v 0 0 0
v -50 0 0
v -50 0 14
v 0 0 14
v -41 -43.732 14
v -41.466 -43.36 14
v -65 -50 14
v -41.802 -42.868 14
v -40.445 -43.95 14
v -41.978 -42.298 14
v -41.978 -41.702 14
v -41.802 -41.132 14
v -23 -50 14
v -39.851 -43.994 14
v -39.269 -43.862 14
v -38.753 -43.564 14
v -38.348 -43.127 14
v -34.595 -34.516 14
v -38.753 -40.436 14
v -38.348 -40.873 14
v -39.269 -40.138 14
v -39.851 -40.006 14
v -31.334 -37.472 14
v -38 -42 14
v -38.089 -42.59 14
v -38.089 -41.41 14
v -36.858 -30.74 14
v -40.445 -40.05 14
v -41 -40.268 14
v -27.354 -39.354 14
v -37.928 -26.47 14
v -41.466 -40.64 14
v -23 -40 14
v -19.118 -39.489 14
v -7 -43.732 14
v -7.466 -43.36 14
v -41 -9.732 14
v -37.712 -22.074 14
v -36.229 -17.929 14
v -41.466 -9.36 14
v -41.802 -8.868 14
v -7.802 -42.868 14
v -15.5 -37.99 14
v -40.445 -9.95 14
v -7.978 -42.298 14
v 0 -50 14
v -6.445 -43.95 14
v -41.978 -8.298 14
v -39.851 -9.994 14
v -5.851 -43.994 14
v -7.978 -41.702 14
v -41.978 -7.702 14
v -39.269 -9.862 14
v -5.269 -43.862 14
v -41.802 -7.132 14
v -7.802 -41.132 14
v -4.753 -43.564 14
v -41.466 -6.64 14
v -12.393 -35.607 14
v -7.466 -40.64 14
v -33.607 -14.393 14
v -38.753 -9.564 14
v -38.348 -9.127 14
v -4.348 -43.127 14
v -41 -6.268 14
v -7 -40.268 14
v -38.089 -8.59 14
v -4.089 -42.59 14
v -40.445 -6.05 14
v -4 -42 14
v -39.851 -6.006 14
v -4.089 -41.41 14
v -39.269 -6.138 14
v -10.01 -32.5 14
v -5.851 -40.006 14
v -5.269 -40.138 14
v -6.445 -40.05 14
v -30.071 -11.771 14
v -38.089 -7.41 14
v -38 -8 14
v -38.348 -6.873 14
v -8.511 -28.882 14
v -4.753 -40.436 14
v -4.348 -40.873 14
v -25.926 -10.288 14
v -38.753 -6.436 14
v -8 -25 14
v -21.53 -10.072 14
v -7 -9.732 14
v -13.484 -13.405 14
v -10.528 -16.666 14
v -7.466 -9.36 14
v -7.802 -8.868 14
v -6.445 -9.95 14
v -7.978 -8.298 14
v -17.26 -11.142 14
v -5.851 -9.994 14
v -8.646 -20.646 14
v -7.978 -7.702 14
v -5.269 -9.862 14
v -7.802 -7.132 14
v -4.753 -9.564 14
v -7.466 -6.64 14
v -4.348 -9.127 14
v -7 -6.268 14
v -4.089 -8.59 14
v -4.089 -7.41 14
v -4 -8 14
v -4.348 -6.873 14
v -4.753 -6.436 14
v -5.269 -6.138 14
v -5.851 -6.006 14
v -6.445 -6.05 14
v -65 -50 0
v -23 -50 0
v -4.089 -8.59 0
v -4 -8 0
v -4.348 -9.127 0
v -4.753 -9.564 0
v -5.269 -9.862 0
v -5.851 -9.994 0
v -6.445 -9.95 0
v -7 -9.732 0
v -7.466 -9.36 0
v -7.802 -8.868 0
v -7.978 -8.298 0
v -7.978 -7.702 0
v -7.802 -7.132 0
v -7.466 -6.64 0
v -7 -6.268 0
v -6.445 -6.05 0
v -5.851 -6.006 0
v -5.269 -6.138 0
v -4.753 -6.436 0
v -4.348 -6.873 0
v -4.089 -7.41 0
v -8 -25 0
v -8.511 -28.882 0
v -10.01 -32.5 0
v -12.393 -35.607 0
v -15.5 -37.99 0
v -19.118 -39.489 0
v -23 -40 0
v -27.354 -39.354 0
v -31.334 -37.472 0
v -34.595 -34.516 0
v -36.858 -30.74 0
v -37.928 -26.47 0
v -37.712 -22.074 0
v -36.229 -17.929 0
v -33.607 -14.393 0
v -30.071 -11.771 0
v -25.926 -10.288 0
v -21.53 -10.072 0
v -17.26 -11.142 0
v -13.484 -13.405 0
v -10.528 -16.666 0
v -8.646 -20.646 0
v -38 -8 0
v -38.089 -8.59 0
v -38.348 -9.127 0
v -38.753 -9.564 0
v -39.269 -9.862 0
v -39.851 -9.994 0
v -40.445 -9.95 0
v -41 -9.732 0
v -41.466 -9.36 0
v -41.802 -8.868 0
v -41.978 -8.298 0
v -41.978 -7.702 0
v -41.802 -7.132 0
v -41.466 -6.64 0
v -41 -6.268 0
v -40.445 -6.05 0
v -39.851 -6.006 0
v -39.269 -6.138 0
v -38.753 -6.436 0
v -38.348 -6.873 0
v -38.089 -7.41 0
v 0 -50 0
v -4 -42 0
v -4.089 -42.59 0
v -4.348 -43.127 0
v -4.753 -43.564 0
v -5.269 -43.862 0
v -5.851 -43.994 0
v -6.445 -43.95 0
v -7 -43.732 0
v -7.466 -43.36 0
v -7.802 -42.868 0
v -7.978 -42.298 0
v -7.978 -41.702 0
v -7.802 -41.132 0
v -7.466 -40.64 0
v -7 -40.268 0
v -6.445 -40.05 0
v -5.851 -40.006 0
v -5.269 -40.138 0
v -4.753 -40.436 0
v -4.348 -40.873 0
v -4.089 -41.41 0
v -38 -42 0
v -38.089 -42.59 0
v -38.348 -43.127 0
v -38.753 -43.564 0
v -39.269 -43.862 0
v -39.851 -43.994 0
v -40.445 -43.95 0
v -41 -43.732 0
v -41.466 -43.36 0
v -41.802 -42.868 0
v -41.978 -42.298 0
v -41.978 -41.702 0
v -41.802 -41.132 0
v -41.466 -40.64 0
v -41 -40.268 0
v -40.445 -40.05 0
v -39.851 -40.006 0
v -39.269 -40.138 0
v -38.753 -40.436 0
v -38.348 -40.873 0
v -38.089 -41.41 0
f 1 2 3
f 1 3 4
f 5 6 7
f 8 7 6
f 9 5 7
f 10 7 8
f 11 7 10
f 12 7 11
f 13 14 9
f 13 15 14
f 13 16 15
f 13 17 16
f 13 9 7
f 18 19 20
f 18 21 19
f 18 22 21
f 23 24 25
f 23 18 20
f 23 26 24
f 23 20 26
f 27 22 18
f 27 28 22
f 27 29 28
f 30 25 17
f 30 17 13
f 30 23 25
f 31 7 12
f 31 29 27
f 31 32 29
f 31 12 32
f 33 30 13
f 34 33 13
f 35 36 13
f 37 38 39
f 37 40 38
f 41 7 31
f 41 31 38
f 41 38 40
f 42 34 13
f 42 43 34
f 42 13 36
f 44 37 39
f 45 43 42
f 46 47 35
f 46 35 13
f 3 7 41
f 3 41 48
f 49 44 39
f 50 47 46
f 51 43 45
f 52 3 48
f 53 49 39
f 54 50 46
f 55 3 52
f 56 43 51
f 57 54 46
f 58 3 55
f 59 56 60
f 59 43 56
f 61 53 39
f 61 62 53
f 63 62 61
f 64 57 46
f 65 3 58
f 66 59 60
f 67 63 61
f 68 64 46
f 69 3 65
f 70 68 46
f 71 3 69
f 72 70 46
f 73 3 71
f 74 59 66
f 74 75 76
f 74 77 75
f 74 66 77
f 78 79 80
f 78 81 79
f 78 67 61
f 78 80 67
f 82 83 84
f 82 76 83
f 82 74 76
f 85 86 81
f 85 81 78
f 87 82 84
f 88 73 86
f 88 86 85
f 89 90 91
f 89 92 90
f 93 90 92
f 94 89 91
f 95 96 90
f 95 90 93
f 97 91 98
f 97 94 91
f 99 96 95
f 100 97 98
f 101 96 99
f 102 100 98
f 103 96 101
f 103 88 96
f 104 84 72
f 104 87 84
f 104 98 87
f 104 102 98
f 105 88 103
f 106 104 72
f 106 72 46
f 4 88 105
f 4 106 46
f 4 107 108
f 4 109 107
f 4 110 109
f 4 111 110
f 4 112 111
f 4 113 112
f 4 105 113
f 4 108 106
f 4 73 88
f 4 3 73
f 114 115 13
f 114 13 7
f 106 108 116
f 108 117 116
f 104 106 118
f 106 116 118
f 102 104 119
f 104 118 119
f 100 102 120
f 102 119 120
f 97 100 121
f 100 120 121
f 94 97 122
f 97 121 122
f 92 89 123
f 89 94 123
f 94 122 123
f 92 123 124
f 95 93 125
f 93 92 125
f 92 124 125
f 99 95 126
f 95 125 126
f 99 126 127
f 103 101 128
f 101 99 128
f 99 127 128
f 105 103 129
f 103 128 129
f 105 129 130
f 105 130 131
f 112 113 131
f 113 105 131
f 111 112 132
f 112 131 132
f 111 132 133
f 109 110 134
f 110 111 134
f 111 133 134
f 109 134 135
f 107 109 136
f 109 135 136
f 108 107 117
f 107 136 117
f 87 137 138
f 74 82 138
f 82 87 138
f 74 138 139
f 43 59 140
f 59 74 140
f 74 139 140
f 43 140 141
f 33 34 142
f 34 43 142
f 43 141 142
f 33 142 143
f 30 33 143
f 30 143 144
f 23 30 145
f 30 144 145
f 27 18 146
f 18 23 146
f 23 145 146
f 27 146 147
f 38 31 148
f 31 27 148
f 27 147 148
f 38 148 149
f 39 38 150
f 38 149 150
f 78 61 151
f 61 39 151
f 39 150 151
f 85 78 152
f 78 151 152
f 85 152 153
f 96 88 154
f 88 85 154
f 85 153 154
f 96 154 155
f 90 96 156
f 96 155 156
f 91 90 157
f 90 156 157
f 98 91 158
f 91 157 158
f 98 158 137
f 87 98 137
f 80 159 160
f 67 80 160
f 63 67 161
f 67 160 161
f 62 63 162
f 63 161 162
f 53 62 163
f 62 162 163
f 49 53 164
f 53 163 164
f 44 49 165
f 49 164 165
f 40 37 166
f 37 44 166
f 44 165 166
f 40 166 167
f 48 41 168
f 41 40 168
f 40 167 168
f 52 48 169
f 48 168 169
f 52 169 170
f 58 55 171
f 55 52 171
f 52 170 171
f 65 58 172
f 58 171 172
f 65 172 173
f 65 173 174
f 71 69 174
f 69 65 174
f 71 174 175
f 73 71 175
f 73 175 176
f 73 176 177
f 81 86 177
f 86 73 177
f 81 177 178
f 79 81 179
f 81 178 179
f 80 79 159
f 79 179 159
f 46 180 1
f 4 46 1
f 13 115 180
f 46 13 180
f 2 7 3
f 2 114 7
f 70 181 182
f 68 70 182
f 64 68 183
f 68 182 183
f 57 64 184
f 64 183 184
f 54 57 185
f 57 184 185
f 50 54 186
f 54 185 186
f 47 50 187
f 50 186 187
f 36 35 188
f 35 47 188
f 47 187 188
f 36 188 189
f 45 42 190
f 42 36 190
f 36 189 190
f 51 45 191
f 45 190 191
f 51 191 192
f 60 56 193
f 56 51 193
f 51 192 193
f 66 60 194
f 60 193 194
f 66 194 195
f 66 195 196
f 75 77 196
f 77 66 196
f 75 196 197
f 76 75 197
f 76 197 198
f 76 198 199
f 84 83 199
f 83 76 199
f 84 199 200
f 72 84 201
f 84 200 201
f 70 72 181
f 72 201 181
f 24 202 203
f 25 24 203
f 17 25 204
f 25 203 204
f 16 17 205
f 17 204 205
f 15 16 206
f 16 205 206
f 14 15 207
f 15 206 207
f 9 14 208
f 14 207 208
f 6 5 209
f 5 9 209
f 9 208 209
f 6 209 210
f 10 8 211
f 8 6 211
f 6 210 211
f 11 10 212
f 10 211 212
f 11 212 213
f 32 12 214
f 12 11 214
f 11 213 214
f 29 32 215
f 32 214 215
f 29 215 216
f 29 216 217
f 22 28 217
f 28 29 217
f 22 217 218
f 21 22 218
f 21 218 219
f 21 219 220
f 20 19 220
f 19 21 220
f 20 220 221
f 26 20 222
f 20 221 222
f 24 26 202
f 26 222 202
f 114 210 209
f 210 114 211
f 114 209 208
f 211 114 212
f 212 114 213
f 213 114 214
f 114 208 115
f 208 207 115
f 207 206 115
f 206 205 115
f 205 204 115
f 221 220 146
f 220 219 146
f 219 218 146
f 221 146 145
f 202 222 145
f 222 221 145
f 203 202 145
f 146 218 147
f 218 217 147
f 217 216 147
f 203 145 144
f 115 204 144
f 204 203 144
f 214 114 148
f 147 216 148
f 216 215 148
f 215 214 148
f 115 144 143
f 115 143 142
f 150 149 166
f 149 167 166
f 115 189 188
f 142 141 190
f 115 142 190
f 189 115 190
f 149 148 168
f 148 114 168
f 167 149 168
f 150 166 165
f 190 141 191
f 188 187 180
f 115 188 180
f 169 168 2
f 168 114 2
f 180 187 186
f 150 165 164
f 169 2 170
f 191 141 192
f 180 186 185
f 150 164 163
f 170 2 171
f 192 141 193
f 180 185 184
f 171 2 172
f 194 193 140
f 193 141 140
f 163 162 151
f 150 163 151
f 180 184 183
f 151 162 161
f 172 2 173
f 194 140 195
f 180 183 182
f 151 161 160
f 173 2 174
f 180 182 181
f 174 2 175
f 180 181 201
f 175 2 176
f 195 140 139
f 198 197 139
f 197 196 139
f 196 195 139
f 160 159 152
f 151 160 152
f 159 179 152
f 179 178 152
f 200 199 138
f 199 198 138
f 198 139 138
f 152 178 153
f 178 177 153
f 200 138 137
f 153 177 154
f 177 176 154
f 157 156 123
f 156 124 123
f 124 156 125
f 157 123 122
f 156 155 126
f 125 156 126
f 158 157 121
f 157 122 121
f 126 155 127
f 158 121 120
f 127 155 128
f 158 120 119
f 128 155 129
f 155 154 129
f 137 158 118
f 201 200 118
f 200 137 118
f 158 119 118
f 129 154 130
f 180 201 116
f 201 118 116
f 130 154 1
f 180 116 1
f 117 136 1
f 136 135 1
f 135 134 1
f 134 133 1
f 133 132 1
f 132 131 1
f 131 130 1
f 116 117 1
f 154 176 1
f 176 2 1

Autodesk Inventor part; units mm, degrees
ref_plane "YZ Plane" through (0, 0, 0) normal (1, 0, 0) x (0, 1, 0)
ref_plane "XZ Plane" through (0, 0, 0) normal (0, 1, 0) x (-1, 0, 0)
ref_plane "XY Plane" through (0, 0, 0) normal (0, 0, 1) x (1, 0, 0)
sketch "Szkic6" plane through (0, 0, 0) normal (0, 0, 1) x (1, 0, 0)
  circle A0 centre (-40, -42) radius 2
  circle A1 centre (-40, -8) radius 2
  circle A2 centre (-6, -8) radius 2
  circle A3 centre (-6, -42) radius 2
  circle A4 centre (-23, -25) radius 15
  line L0 (0, -50) -> (0, 0)
  line L1 (-50, 0) -> (0, 0)
  line L2 (-65, -50) -> (-50, 0)
  line L3 (-23, -25) -> (-23, -50)
  line L4 (-23, -50) -> (0, -50)
  line L5 (-23, -50) -> (-65, -50)
  dimension "d30" = 25
extrude "Wyciągnięcie proste4" add sketch "Szkic6" along normal blind 14
properties part number "Wspornik łożyska osi Y - prawa strona"
